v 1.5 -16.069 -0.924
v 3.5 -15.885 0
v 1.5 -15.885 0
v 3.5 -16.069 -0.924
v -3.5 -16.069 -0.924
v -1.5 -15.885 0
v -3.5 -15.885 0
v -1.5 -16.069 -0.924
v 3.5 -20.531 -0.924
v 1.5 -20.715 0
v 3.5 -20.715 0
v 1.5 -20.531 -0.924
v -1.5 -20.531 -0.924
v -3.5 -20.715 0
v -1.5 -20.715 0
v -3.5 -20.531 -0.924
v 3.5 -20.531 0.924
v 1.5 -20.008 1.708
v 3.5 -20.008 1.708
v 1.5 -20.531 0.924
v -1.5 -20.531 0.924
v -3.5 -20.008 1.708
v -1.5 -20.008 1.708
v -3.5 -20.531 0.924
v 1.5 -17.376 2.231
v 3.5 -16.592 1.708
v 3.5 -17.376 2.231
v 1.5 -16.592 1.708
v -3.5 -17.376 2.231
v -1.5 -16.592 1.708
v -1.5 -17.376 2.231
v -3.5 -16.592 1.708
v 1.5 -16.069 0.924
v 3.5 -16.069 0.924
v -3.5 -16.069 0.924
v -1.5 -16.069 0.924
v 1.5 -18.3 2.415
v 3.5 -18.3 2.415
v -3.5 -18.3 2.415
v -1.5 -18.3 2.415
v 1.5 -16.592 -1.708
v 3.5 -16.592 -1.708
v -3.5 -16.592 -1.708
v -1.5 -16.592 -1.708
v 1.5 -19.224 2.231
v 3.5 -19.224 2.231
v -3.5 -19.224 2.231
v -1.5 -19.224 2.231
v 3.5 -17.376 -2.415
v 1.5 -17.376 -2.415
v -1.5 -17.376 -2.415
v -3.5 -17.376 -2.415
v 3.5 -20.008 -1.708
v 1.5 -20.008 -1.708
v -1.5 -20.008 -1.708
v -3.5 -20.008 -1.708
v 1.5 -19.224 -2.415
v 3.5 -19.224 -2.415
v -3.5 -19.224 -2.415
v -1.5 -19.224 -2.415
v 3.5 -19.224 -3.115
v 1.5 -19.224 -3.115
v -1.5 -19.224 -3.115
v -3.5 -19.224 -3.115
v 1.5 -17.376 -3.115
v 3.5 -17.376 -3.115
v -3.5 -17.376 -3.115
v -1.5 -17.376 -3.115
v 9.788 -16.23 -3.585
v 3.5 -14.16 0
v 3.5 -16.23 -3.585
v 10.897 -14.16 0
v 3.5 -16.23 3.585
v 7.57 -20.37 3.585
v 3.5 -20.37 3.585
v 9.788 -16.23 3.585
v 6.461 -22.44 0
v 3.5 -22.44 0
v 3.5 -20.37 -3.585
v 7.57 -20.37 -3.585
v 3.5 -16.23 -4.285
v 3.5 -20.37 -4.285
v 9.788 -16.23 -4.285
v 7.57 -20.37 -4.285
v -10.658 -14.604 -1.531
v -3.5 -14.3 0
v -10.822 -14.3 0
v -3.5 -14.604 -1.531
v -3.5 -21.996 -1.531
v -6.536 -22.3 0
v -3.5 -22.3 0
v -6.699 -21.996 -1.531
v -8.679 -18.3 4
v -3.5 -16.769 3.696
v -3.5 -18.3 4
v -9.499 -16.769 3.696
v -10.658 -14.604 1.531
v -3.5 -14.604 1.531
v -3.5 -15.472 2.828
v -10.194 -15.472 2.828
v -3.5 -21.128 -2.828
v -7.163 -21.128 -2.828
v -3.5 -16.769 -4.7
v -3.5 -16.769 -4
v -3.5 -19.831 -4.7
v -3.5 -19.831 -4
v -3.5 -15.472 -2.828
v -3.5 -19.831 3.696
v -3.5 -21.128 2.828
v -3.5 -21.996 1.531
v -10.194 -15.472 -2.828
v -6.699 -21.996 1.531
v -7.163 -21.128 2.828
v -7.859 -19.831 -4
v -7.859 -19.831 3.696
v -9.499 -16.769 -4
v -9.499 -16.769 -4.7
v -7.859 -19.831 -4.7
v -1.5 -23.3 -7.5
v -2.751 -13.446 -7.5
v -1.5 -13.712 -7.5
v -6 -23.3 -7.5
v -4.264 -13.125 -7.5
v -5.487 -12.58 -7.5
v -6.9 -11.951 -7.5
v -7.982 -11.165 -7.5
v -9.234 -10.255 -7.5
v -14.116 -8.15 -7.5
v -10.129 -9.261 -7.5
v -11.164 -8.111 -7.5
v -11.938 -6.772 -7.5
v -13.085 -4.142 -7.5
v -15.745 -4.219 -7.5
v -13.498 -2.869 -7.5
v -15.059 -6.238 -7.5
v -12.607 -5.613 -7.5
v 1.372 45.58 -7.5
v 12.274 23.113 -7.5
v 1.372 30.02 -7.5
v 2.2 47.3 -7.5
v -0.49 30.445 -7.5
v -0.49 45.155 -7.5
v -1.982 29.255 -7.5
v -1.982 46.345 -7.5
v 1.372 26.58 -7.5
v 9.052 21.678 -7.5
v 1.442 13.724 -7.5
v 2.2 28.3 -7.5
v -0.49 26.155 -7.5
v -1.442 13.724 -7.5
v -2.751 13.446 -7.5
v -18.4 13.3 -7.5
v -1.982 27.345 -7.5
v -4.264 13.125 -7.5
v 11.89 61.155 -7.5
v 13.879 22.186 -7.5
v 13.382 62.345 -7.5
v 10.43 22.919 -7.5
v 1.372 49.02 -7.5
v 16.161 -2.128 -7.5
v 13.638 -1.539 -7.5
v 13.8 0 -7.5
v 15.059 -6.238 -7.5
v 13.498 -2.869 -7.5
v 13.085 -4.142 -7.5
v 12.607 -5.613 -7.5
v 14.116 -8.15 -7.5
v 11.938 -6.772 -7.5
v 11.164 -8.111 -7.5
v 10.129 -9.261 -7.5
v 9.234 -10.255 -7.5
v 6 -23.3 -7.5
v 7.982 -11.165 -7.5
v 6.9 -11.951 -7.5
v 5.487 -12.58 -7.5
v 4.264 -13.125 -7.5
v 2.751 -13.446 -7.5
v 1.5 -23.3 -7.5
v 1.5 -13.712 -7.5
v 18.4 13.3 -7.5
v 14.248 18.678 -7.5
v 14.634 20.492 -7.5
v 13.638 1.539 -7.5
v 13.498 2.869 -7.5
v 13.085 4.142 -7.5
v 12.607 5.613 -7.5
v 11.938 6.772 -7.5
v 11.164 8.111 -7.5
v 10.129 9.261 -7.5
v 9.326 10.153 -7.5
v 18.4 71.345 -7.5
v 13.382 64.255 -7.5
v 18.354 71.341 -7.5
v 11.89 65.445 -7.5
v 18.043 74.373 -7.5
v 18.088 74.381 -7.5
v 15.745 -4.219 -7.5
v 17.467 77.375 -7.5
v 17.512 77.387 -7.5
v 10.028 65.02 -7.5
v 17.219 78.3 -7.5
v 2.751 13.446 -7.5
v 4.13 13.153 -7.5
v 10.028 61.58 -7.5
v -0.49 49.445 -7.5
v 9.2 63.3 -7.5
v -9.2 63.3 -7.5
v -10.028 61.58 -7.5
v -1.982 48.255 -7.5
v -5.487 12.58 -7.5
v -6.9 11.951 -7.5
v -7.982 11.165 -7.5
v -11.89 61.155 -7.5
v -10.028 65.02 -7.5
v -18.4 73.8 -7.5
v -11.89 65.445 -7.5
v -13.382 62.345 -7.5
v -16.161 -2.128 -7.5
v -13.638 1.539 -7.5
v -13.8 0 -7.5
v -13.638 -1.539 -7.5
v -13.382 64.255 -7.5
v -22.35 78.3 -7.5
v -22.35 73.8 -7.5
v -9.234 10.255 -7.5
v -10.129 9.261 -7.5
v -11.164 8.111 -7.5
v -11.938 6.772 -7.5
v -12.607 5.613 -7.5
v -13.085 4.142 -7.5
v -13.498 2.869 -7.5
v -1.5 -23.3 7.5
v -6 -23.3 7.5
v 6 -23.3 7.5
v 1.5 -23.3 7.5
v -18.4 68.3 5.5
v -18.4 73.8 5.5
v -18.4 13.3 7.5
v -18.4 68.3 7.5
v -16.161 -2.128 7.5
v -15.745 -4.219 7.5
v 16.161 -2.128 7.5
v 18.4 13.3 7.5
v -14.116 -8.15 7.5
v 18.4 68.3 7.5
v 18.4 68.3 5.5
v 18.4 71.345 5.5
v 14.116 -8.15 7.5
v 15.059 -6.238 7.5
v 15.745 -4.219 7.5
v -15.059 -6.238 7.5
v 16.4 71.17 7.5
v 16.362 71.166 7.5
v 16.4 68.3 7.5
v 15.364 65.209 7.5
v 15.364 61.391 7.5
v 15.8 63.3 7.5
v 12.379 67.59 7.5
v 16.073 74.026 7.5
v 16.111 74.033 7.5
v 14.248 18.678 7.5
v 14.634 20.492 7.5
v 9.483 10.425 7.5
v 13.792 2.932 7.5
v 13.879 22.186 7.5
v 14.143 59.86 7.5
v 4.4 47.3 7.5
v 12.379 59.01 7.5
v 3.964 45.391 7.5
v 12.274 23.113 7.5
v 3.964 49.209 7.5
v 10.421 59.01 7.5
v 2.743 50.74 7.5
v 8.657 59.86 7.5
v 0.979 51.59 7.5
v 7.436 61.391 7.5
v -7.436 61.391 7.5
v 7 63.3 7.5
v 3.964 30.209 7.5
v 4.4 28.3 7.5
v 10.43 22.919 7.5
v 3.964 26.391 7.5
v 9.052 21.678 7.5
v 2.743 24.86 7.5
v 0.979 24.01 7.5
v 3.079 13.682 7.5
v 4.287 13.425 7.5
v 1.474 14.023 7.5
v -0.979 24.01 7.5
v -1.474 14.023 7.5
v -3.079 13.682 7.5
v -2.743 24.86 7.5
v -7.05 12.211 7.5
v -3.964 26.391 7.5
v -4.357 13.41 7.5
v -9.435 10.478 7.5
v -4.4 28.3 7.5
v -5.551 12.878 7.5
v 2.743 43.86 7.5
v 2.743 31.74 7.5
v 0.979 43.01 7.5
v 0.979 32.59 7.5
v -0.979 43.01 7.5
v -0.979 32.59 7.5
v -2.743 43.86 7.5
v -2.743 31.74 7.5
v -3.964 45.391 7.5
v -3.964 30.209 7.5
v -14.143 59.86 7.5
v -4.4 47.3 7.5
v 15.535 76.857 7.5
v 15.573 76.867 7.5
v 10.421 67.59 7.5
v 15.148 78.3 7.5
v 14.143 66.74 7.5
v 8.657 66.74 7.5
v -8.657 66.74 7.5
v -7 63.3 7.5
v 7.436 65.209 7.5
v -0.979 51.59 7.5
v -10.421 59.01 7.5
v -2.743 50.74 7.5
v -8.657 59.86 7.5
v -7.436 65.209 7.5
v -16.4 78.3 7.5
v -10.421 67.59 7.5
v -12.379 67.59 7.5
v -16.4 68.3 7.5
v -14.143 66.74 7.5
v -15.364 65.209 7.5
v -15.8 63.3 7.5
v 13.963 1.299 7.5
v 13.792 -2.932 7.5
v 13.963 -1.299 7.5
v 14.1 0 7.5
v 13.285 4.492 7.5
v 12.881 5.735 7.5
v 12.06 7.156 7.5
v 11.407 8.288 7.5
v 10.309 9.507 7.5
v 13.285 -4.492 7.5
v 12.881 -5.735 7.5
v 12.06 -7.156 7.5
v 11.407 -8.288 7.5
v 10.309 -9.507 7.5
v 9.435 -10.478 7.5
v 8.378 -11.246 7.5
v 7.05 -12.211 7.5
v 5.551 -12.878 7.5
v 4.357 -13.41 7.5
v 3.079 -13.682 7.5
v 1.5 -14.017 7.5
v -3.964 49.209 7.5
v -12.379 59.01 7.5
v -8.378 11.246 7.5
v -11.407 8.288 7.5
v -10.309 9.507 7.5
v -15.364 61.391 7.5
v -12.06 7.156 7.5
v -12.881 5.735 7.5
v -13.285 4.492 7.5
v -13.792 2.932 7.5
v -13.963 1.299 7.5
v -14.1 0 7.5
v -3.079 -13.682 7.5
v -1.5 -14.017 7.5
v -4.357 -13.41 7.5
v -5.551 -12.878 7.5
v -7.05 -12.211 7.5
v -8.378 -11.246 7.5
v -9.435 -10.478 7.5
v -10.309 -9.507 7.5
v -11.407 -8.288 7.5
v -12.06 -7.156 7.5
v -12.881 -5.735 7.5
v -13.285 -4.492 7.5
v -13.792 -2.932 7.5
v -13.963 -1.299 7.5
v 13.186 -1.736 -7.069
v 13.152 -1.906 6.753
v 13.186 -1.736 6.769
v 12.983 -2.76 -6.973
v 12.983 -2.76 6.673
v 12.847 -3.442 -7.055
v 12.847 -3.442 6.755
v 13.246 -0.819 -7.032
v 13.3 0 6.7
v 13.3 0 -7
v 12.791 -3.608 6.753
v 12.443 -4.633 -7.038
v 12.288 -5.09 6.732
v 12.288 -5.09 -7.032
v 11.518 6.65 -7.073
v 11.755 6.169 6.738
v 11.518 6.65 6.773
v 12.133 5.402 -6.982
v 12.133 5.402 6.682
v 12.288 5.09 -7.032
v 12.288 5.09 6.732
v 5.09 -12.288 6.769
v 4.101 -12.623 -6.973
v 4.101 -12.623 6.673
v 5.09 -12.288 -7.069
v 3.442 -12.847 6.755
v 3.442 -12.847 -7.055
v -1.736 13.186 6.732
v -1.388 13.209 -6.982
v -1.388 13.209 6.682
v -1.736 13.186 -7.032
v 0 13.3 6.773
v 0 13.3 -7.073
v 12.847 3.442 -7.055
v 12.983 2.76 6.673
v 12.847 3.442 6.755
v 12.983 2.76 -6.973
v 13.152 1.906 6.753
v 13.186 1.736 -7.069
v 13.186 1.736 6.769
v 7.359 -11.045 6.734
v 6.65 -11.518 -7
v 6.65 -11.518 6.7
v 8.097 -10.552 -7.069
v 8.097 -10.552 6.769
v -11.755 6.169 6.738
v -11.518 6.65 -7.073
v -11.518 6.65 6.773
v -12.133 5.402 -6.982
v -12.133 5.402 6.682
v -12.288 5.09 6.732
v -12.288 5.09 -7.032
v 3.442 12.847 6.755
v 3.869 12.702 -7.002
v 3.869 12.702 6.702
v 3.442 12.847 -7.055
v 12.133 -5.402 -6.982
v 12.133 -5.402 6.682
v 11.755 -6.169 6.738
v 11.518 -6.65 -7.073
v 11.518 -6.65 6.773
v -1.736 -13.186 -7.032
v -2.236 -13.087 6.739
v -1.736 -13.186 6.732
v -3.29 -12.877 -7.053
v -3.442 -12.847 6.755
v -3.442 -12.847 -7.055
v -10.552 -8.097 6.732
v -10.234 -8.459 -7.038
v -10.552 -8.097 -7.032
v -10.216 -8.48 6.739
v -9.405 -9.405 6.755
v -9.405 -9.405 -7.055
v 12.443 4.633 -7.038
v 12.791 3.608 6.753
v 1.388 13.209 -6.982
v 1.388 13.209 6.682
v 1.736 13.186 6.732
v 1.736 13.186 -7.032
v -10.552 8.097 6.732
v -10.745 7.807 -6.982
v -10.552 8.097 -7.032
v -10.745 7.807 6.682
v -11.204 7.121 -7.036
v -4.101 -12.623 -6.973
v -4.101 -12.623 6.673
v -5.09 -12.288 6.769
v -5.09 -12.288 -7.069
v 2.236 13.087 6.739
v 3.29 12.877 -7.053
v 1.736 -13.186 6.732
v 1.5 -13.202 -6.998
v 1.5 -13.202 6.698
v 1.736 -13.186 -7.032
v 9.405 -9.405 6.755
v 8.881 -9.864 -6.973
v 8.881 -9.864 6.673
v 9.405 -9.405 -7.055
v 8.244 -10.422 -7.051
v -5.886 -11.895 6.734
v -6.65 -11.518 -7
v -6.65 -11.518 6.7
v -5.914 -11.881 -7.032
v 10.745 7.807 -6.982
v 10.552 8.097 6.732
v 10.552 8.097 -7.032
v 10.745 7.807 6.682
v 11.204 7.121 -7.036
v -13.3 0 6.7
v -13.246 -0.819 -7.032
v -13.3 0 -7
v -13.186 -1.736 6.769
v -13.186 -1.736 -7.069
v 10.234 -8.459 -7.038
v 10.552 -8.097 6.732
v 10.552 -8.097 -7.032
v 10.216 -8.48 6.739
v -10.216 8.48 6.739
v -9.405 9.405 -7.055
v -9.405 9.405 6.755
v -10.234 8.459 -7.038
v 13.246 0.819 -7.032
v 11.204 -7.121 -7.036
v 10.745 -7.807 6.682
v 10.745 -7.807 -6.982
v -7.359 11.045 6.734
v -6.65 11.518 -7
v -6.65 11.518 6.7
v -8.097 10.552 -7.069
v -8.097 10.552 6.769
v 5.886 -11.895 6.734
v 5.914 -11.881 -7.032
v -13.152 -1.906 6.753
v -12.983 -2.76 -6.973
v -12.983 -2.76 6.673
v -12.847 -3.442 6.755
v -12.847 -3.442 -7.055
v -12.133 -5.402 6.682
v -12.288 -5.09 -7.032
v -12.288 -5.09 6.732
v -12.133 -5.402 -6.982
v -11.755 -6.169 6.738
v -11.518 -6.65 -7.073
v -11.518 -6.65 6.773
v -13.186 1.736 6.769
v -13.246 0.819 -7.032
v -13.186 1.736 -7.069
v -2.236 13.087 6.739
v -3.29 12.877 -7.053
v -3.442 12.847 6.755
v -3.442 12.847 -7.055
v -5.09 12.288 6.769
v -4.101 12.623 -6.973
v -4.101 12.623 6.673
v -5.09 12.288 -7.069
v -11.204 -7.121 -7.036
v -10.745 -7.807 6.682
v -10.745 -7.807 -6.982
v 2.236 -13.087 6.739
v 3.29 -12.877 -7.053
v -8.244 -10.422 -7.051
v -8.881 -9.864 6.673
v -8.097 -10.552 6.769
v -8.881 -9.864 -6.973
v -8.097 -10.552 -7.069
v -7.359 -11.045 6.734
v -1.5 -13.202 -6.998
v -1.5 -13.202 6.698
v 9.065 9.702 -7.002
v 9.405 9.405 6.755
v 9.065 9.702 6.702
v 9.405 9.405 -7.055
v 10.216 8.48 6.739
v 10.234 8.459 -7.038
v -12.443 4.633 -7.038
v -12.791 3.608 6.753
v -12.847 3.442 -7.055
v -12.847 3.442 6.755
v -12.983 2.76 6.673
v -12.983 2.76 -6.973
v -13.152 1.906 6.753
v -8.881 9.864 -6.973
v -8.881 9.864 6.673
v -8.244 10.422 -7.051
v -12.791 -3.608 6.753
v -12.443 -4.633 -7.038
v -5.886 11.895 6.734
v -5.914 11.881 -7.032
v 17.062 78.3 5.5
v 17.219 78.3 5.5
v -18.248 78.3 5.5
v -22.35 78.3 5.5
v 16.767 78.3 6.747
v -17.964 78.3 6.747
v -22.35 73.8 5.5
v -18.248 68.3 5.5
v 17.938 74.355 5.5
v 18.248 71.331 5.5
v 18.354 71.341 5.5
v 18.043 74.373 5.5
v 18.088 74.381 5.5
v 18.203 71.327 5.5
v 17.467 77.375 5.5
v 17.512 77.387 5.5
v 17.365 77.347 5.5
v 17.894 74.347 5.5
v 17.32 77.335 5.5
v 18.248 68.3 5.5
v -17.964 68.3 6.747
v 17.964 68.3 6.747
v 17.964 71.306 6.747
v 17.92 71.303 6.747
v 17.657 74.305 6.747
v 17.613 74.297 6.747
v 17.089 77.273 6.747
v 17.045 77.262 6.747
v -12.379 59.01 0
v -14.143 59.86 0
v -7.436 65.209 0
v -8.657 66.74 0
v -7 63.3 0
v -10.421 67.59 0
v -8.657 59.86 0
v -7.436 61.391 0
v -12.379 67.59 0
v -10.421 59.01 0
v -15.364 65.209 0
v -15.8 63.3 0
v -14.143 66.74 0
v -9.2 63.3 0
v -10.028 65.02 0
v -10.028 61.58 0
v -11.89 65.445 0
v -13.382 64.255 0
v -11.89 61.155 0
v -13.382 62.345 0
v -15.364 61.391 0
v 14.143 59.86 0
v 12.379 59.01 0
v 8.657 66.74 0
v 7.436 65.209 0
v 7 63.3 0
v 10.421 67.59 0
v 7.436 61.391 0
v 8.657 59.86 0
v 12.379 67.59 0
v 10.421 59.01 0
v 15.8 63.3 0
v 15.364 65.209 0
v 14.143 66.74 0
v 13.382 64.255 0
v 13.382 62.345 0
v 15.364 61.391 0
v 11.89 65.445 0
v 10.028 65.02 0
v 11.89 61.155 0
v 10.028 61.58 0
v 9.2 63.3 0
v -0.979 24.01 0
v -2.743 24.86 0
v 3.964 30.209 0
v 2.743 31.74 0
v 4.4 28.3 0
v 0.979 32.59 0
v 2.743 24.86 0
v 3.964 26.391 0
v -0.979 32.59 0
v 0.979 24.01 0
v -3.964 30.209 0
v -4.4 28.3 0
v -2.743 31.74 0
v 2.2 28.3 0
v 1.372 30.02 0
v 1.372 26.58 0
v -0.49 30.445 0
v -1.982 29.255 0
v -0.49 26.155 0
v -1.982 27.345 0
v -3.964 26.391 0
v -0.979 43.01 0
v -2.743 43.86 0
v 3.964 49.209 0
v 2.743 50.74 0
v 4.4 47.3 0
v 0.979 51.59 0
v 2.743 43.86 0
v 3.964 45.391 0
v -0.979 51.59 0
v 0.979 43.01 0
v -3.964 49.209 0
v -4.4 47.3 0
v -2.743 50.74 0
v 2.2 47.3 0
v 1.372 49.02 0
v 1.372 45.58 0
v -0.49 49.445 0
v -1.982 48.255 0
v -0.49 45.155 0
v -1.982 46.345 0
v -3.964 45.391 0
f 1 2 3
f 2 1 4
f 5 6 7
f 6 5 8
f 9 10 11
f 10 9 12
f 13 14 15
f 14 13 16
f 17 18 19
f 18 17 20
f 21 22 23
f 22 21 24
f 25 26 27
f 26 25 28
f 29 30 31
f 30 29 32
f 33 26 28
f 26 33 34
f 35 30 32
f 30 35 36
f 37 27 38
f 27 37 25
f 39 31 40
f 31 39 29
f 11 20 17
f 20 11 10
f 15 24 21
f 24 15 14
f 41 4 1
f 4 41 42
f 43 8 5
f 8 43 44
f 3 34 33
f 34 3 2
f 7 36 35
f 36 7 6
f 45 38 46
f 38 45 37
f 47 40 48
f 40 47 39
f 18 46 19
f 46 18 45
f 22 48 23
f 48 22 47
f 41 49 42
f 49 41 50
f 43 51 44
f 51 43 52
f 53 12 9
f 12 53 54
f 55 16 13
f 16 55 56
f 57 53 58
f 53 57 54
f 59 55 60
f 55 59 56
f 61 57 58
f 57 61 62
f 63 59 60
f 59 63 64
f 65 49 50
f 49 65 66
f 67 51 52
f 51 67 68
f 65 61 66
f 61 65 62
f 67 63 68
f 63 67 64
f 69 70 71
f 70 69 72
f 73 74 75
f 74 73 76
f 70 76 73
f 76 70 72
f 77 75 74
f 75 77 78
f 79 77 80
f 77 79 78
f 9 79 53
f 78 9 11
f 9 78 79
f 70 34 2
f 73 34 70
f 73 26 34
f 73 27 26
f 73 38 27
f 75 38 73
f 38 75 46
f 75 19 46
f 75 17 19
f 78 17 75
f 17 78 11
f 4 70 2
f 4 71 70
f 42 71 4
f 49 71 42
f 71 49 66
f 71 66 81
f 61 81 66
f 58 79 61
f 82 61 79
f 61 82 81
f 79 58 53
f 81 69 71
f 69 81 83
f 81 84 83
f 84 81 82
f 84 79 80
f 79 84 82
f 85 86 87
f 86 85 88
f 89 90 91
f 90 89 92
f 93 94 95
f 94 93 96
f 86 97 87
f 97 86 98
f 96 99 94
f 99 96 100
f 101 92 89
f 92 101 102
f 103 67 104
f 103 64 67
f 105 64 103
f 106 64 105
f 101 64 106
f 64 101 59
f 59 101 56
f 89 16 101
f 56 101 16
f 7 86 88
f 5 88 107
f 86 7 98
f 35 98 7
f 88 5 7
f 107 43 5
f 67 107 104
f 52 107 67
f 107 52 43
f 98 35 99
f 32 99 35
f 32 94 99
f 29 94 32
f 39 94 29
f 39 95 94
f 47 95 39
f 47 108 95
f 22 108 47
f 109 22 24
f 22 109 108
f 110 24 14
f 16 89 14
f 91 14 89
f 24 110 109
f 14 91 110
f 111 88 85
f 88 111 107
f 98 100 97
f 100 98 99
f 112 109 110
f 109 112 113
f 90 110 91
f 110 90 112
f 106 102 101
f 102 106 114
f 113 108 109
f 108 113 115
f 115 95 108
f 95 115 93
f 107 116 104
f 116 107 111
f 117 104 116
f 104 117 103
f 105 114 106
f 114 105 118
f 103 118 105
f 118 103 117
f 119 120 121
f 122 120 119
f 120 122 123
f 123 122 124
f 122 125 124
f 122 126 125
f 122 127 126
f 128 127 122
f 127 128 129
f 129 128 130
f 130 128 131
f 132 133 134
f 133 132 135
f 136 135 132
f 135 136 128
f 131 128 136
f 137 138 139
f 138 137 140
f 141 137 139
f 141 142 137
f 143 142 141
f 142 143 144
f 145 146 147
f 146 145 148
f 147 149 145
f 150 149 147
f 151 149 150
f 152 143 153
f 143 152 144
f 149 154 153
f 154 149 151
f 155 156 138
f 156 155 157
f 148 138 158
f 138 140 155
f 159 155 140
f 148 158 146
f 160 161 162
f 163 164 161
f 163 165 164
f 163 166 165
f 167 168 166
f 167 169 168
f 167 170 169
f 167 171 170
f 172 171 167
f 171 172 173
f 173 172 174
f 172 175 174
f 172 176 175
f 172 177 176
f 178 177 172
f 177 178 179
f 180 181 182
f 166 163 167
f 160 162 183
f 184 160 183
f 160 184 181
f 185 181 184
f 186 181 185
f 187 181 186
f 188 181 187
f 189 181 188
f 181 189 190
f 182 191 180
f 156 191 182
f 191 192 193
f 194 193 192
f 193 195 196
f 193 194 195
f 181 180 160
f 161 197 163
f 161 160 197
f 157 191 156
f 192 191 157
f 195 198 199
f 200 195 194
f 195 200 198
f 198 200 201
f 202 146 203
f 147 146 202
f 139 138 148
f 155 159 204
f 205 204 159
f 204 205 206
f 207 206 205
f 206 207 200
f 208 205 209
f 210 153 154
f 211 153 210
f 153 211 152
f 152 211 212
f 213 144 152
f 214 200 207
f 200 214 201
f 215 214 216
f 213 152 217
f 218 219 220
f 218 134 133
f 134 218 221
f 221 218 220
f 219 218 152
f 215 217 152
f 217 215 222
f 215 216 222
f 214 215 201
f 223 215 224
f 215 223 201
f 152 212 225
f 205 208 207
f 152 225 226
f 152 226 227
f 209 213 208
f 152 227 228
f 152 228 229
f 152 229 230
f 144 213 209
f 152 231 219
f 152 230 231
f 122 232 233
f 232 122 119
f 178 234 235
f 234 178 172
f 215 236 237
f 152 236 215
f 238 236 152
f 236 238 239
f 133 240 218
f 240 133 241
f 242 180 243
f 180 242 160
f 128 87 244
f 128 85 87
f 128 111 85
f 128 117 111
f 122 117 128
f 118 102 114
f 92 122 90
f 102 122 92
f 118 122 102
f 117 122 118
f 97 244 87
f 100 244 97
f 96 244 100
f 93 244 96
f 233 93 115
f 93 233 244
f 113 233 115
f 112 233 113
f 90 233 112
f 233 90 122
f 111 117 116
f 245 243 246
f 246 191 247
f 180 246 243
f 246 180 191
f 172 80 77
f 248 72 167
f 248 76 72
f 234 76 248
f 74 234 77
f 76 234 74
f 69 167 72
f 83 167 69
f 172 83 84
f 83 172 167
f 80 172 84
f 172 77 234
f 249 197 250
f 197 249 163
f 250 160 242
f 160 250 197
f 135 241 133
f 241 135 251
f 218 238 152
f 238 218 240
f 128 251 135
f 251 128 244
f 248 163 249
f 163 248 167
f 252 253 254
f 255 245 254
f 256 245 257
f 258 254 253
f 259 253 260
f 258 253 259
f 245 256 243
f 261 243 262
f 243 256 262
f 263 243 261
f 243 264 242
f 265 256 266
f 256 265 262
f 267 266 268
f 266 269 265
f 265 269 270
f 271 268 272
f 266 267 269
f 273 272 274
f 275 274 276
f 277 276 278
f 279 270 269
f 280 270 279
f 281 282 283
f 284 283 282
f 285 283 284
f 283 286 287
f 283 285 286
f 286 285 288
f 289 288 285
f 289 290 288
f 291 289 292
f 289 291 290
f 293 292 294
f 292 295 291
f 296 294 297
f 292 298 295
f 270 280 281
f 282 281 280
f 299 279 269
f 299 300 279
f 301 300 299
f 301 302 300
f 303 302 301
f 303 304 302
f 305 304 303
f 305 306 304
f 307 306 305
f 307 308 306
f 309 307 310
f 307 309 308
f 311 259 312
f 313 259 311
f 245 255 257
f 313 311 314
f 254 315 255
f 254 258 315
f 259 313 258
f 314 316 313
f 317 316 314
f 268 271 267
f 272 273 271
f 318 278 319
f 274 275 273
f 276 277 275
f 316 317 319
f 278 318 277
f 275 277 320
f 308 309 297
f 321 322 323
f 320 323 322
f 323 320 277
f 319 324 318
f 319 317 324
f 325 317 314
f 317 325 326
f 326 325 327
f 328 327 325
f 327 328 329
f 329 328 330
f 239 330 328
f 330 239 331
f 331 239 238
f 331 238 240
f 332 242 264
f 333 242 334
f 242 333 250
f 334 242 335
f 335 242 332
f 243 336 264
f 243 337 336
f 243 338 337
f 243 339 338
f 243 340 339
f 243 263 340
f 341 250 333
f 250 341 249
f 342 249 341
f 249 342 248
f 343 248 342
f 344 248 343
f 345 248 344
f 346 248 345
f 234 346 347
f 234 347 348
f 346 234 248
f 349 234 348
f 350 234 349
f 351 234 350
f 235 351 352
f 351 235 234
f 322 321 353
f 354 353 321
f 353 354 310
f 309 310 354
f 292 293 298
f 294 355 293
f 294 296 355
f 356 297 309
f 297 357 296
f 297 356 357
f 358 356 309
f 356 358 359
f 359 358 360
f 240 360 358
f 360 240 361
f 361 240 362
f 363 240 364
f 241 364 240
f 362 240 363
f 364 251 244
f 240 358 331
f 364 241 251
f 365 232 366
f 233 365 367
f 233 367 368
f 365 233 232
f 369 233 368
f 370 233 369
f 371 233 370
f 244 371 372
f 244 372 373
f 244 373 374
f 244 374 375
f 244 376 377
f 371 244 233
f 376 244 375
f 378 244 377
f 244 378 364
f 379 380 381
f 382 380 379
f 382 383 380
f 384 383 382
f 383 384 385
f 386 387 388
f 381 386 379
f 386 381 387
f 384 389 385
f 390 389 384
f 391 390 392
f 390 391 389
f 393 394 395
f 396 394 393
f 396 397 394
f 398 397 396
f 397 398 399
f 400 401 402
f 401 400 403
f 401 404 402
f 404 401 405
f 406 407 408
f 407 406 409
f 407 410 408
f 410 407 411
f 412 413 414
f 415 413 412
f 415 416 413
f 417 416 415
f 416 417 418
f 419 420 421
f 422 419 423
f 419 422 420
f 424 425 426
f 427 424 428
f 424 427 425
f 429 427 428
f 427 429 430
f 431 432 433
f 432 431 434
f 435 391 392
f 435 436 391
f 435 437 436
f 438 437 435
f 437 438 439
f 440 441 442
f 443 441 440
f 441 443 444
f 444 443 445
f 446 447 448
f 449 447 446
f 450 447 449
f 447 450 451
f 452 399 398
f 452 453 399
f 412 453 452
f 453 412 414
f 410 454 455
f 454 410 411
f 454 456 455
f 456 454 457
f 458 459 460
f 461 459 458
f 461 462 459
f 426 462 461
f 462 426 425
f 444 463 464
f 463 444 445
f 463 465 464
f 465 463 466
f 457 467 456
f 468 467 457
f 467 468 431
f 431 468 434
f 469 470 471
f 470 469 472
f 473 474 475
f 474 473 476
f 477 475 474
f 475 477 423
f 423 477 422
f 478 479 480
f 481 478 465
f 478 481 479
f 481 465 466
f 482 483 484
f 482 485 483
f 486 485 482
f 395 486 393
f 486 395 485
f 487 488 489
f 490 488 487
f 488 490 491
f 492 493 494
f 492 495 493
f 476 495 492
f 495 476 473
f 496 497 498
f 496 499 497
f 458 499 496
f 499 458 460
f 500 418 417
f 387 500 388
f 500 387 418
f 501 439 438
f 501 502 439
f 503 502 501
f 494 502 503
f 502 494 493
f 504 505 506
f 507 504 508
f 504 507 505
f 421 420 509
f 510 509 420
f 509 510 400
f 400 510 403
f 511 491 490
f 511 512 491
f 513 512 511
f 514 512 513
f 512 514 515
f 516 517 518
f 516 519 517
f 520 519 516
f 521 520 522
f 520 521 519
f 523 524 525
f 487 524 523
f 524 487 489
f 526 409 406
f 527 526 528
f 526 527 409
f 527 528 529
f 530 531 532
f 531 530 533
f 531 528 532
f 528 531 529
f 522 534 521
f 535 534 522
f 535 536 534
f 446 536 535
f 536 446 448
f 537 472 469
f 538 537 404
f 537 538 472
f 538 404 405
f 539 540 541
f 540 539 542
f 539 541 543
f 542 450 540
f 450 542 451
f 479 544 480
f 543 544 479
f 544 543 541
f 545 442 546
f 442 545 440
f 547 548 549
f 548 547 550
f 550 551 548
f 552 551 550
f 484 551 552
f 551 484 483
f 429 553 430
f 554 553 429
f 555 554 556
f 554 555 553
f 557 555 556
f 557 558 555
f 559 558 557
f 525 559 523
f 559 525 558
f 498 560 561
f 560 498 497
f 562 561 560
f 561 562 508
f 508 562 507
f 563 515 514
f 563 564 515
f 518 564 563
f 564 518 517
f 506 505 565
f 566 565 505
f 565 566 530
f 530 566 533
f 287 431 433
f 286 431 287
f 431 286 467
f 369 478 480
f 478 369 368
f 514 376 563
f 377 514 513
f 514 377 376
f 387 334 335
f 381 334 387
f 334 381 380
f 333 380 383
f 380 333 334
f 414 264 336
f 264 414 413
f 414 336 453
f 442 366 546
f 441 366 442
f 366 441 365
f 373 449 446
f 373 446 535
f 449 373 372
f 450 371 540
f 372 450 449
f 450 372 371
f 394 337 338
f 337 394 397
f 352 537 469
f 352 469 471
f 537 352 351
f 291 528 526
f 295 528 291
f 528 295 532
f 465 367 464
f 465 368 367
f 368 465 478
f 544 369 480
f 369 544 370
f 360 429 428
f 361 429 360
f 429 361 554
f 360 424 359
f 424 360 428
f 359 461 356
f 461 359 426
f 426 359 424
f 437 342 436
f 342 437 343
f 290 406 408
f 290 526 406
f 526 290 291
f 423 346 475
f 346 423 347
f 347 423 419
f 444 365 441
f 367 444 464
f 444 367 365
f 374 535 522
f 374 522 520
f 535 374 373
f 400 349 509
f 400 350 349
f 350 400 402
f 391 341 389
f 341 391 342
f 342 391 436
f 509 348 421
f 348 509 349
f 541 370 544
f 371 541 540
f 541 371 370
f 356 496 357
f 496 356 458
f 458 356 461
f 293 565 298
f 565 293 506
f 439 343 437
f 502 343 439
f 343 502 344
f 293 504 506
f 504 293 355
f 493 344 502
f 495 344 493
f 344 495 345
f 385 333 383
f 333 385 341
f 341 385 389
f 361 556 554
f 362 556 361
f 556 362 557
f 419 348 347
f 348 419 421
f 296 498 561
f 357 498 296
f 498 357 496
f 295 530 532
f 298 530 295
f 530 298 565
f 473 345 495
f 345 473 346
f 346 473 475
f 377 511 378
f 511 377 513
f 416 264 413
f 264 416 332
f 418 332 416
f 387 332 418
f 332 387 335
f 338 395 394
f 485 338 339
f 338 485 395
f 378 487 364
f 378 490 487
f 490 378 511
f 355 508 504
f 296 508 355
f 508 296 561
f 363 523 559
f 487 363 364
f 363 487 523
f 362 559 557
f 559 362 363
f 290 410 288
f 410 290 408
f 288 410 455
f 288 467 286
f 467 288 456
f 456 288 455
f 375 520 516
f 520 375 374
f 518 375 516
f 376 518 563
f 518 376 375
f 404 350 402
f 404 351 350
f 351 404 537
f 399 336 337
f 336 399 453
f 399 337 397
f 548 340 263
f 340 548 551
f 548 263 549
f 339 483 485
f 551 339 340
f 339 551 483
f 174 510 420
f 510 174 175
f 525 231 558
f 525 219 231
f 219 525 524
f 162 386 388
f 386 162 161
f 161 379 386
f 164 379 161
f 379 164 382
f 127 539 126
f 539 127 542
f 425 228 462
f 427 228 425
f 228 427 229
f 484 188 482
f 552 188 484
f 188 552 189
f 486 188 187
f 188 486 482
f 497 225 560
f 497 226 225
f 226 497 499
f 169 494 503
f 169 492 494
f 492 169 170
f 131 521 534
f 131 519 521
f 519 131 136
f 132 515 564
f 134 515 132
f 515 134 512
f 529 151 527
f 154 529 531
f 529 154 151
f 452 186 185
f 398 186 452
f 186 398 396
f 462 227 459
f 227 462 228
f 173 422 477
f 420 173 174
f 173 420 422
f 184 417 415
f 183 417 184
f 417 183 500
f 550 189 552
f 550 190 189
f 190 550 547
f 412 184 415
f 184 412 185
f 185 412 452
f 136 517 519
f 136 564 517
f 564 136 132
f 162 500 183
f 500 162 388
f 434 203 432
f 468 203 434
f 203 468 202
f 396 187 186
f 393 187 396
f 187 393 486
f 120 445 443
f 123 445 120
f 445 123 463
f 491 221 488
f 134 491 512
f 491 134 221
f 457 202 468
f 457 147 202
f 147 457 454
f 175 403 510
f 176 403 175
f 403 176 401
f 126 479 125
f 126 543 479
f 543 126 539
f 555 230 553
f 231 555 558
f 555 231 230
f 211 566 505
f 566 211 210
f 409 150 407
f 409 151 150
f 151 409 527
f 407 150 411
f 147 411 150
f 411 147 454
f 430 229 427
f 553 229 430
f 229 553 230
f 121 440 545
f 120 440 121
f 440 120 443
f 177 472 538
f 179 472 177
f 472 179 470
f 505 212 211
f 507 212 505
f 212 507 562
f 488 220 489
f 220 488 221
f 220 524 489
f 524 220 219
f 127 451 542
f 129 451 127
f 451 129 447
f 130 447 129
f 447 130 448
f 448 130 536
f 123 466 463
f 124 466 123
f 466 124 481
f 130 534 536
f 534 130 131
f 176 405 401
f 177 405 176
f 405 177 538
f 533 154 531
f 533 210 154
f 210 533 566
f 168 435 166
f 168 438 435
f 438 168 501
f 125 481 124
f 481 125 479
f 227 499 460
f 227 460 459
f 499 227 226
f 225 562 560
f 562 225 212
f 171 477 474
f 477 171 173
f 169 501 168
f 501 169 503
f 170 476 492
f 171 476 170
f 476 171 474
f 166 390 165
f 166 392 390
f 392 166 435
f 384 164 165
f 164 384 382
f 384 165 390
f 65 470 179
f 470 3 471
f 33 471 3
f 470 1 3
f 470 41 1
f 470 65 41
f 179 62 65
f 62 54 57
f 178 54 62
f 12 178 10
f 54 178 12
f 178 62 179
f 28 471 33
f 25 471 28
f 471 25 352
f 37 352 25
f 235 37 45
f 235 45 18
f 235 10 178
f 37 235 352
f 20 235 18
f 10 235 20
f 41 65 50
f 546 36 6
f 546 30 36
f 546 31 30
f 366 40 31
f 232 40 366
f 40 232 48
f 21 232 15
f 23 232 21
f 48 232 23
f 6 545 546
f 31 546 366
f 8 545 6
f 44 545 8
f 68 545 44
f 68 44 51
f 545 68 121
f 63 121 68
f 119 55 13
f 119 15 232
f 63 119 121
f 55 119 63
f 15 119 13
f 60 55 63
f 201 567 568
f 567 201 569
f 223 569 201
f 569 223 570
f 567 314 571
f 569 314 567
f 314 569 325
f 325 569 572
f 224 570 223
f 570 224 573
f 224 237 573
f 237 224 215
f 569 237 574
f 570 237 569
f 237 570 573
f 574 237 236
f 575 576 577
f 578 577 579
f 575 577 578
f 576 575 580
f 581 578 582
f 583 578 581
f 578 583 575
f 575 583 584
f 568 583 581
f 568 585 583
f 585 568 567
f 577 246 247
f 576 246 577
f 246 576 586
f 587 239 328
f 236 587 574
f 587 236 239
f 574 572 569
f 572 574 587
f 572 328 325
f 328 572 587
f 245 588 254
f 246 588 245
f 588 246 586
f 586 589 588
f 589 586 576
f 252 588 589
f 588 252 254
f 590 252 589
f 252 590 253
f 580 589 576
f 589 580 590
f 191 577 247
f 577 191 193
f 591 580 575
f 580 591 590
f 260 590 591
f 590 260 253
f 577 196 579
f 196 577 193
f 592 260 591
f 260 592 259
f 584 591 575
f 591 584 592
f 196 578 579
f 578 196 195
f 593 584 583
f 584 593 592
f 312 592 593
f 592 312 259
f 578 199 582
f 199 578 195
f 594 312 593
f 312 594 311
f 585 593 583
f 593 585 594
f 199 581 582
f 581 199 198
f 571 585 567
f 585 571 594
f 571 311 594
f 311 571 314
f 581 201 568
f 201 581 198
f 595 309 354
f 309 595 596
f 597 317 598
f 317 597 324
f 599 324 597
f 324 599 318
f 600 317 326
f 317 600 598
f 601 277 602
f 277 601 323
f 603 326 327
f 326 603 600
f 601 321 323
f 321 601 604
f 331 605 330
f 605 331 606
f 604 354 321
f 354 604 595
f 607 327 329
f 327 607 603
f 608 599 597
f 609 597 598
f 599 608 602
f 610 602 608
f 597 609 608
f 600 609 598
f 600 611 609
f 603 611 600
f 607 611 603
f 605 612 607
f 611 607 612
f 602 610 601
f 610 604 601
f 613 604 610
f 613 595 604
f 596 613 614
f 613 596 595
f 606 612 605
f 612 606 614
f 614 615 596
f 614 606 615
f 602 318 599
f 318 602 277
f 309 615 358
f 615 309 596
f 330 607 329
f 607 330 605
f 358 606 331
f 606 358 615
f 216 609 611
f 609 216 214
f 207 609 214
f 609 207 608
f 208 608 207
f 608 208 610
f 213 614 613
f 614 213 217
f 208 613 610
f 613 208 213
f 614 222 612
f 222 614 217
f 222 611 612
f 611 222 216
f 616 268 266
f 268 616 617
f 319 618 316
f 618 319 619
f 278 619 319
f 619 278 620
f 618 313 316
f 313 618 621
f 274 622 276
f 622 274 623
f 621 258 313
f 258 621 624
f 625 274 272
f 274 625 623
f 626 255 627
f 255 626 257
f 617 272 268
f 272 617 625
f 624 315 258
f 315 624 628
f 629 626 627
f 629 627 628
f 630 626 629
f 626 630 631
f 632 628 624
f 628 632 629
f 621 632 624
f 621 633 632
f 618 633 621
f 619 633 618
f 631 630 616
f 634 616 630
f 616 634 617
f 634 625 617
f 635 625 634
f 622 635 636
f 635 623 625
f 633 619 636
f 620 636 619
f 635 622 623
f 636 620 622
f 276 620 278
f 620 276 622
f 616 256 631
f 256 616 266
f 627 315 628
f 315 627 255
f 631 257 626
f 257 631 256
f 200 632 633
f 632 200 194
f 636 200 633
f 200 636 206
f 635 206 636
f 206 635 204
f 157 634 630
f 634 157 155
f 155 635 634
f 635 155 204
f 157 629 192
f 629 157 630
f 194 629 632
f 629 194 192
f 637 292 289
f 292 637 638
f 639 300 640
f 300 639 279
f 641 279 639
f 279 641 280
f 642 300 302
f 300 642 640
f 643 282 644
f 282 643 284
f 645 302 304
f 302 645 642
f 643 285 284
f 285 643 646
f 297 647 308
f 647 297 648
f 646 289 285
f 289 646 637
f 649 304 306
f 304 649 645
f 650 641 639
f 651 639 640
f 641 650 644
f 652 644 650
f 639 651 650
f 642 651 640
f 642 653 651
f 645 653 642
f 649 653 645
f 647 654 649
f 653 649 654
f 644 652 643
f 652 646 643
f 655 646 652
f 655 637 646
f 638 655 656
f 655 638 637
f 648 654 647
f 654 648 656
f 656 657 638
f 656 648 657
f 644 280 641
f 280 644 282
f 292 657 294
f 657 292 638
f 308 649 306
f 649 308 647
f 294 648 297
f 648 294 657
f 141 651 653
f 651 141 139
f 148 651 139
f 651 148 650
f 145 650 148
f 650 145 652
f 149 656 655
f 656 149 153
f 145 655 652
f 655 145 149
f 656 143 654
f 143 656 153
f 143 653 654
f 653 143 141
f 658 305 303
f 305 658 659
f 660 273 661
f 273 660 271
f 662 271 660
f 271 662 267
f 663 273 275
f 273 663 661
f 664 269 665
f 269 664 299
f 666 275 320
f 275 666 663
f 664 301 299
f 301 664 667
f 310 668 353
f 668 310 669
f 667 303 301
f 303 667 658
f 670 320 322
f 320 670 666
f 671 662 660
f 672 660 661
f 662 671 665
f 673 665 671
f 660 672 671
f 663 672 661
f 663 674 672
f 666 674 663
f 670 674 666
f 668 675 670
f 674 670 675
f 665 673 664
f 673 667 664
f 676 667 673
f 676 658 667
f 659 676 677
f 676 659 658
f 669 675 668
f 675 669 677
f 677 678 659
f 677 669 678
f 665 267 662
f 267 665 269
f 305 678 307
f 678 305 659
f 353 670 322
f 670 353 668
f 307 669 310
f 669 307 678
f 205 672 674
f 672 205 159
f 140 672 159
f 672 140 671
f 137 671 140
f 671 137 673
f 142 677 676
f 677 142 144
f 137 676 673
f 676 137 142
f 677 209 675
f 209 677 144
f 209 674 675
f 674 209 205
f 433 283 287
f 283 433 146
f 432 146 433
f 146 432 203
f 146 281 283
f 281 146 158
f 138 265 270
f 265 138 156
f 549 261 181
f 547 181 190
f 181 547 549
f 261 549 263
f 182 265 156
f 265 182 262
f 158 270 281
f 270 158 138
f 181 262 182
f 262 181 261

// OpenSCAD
// file: ../standard_optomechanics/cylinder_clamp.scad
use <../utilities.scad>;
d=0.05;

//for 1 inch/25mm post clamp, an inner radius of 12.8 is good.
	
module cylinder_clamp(
	inner_r=12.8, //radius of the cylinder being clamped (ish!)
	clamp_h=11, //thicknedess of the clamp along the cylinder axis
	clamp_t=4, //thickness of the clamp radially
	flat_t=8, //how thick the bottom of the clamp is (often need to allow for the mounting bolt head here)
	flat_width=15, //width of the flat base
	mounting_bolt=4, //nominal size of mounting bolt (default is 4 for M4, 0 to disable)
	nut_trap=false,
	bevel_top=0.5, //size of 45 degree bevel on top surface
	bevel_bottom=0.8 //size of 45 degree bevel on bottom of hole
	){
	assign(
		post_r = inner_r, //poor initial choice of name!
		bolt_flat_w=10, //width of the region where the bolt is
		gap_w=3 //size of the gap that is squeezed by the bolt
	)
	difference(){
		hull(){
			cylinder(h=clamp_h,r=post_r+clamp_t,center=true,$fn=48);
			translate([0,-post_r-flat_t/2,0]) cube([flat_width,flat_t,clamp_h],center=true);
			translate([0,post_r+bolt_flat_w/2,0]) cube([12,bolt_flat_w,clamp_h],center=true);
		}
	
		cylinder(h=9999,r=post_r,center=true,$fn=48); //cylinder being clamped
		//bevels, top and bottom
		translate([0,0,-clamp_h/2]) cylinder(r1=post_r+3*bevel_bottom,r2=post_r-bevel_bottom,h=4*bevel_bottom,center=true);
		translate([0,0,clamp_h/2]) cylinder(r2=post_r+3*bevel_top,r1=post_r-bevel_top,h=4*bevel_top,center=true);
		//gap (squeezed by bolt)
		translate([0,999,0]) cube([gap_w,999*2,999],center=true); //gap
	
		//clamping bolt
		translate([gap_w/2+2,post_r+bolt_flat_w/2,0]) rotate([0,0,-90]) nut_y(4,h=999,shaft=true);
		translate([-gap_w/2-2,post_r+bolt_flat_w/2,0]) rotate([0,0,90]) cylinder_with_45deg_top(r=4,h=999,$fn=16); //counterbore for nut head
	
		if(mounting_bolt > 0){
			//mounting bolt
			translate([0,-post_r-4.5,0]) rotate([-90,0,0]){
				intersection(){
					rotate([90,0,0])
						if(nut_trap){
							nut_y(mounting_bolt,fudge=1.15,shaft=true,h=999);
						}else{
							screw_y(mounting_bolt,fudge=1.07,shaft=true,h=999);
						}
					cube([inner_r*2,inner_r*2,clamp_h*2],center=true);
				}
			}
		}
		//in the case of thick clamps with thin flats, this keeps the bottom flat
		translate([0,-inner_r-flat_t-999,0]) cube([9999,999*2,9999],center=true);
	}
}

module cylinder_clamp_v(
	inner_r=12.8, //radius of the cylinder being clamped (ish!)
	clamp_h=10, //width of the clamp along the cylinder (y) axis
	clamp_t=4, //thickness of the clamp radially
	flat_t=8, //how thick the bottom of the clamp is (often need to allow for the mounting bolt head here)
	flat_width=15, //width of the flat base
	mounting_bolt=4, //nominal size of mounting bolt (default is 4 for M4, 0 to disable)
	bevel=0.5 //put a 45 degree bevel on the edges of the hole
	){
	assign(
		post_r = inner_r, //poor initial choice of name!
		bolt_flat_w=11, //width of the region where the bolt is
		gap_w=2*inner_r*sin(45/2),//sin(acos(1-(9/2-4/2*1.22)/inner_r))*inner_r //size of the gap that is squeezed by the bolt
		bolt_z = inner_r+4/2*1.22+d //position of bolt (so bolt just clears the cylinder we're clamping
	)assign( //the second assign statement allows us to use gap_w
		bolt_span=gap_w+4+d//max(2*inner_r*sin(acos(1-(9/2-4/2*1.22)/inner_r)), gap_w+4)
	)
	difference(){
		hull(){
			rotate([90,0,0]) cylinder(h=clamp_h,r=inner_r+clamp_t,center=true,$fn=48);
			translate([0,0,-inner_r-flat_t/2]) cube([flat_width,clamp_h,flat_t],center=true);
			translate([0,0,bolt_z]) cube([gap_w+9,clamp_h,bolt_flat_w],center=true);
		}
	
		cylinder_with_45deg_top(h=9999,r=post_r,center=true,$fn=48); //cylinder being clamped
		reflect([0,1,0]) translate([0,clamp_h/2,0]) rotate([90,0,0]) cylinder(r1=post_r+3*bevel,r2=post_r-bevel,h=4*bevel,center=true); //bevel
		translate([0,0,999]) cube([gap_w,999,999*2],center=true); //gap
	
		//clamping bolt
		translate([bolt_span/2,0,bolt_z]) rotate([0,0,-90]) nut_y(4,h=999,shaft=true);
		translate([-bolt_span/2,0,bolt_z]) rotate([0,0,90]) cylinder_with_45deg_top(r=4,h=999,$fn=16); //counterbore for nut head
	
		if(mounting_bolt > 0){
			//mounting bolt
			translate([0,0,-post_r-4.5]){
				cylinder(r=mounting_bolt*1.1,h=post_r,$fn=16);
				cylinder(r=mounting_bolt/2*1.22,h=flat_t*2,center=true,$fn=16);
			}
		}
		translate([0,0,-inner_r-flat_t-999]) cube([9999,9999,999*2],center=true);
	}
}

translate([0,30,0]) cylinder_clamp_v(30.5/2, 10, flat_width=24, mounting_bolt=4, flat_t=8);

cylinder_clamp(30.5/2, flat_width=24, mounting_bolt=4, flat_t=8,nut_trap=true);
// main file
use <../utilities.scad>;
use <../standard_optomechanics/cylinder_clamp.scad>;

bar_to_bag = 65;
bar_r = 26/2+0.3;
bag_y = bar_r + bar_to_bag;
pocket = [85.5,10,36.8];
clip=[15,pocket[1],pocket[2]];
lip = [clip[0], 4.5, 4];

d=0.05;

module rh_clamp(){
    difference(){
        union(){
            rotate([0,90,180]) cylinder_clamp(bar_r, clip[0], 
                        clamp_t=3, flat_t=bar_to_bag-clip[1]+d, flat_width=clip[2], mounting_bolt=0 );
            
            translate([0,bar_to_bag+bar_r,0]){
                translate([0,-clip[1]/2,0]) cube(clip,center=true);
                translate([-lip[0]/2,-lip[1],clip[2]/2-d]) cube(lip);
            }
        }
        
        //chamfer the edge
        assign(r=2){
            translate([clip[0]/2 - r, bag_y-pocket[1], clip[2]/2 - r]){
                difference(){ //radius the top corner of the pocket
                    cube([999,999,999]);
                    rotate([90,0,0]) cylinder(r=r,h=999*3,center=true);
                }
                for(a=[0, 5, 10, 15]) rotate([a,0,0]) translate([0,0,-pocket[2]+2*r - a/180*3.14*r/2]) mirror([0,0,1]) difference(){ //radius the bottom corner of the pocket & allow for swing
                    translate([-clip[0],0,0]) cube([999,999,999]);
                    rotate([90,0,0]) cylinder(r=r,h=999*3,center=true);
                    translate([-clip[0],-999,0]) cube([clip[0],999*2,r]);
                }
                
            }
        }
        
        //bolts to connect central clip
        reflect([0,0,1]) translate([0,bar_to_bag+bar_r-clip[1]-5, clip[2]/2-7]) rotate([0,90,0]){
            cylinder(r=4*1.1,h=999);
            cylinder(r=4/2*1.1,h=999,center=true);
        }
        //bolts to connect central reinforcement
        translate([0,bar_r + 15, 0]) repeat([0,bar_to_bag - 12*3 - clip[1],0],2) rotate([0,90,0]){
            cylinder(r=4*1.1,h=999);
            cylinder(r=4/2*1.1,h=999,center=true);
        }
        
        //brake cable clearance
        rotate([-30,0,0]) hull() repeat([0,bar_r+10,0],2) rotate([0,90,0]) cylinder(h=999,r=3,center=true);
    }
}

//reflect([1,0,0]) translate([-clip[2]/2-10-20,0,0]) 
rotate([0,-90,0]) rh_clamp();

/*rotate([0,-90,0]) intersection(){
    rh_clamp();
    translate([999/2,bag_y,0]) cube([999,24,999],center=true);
}*/
